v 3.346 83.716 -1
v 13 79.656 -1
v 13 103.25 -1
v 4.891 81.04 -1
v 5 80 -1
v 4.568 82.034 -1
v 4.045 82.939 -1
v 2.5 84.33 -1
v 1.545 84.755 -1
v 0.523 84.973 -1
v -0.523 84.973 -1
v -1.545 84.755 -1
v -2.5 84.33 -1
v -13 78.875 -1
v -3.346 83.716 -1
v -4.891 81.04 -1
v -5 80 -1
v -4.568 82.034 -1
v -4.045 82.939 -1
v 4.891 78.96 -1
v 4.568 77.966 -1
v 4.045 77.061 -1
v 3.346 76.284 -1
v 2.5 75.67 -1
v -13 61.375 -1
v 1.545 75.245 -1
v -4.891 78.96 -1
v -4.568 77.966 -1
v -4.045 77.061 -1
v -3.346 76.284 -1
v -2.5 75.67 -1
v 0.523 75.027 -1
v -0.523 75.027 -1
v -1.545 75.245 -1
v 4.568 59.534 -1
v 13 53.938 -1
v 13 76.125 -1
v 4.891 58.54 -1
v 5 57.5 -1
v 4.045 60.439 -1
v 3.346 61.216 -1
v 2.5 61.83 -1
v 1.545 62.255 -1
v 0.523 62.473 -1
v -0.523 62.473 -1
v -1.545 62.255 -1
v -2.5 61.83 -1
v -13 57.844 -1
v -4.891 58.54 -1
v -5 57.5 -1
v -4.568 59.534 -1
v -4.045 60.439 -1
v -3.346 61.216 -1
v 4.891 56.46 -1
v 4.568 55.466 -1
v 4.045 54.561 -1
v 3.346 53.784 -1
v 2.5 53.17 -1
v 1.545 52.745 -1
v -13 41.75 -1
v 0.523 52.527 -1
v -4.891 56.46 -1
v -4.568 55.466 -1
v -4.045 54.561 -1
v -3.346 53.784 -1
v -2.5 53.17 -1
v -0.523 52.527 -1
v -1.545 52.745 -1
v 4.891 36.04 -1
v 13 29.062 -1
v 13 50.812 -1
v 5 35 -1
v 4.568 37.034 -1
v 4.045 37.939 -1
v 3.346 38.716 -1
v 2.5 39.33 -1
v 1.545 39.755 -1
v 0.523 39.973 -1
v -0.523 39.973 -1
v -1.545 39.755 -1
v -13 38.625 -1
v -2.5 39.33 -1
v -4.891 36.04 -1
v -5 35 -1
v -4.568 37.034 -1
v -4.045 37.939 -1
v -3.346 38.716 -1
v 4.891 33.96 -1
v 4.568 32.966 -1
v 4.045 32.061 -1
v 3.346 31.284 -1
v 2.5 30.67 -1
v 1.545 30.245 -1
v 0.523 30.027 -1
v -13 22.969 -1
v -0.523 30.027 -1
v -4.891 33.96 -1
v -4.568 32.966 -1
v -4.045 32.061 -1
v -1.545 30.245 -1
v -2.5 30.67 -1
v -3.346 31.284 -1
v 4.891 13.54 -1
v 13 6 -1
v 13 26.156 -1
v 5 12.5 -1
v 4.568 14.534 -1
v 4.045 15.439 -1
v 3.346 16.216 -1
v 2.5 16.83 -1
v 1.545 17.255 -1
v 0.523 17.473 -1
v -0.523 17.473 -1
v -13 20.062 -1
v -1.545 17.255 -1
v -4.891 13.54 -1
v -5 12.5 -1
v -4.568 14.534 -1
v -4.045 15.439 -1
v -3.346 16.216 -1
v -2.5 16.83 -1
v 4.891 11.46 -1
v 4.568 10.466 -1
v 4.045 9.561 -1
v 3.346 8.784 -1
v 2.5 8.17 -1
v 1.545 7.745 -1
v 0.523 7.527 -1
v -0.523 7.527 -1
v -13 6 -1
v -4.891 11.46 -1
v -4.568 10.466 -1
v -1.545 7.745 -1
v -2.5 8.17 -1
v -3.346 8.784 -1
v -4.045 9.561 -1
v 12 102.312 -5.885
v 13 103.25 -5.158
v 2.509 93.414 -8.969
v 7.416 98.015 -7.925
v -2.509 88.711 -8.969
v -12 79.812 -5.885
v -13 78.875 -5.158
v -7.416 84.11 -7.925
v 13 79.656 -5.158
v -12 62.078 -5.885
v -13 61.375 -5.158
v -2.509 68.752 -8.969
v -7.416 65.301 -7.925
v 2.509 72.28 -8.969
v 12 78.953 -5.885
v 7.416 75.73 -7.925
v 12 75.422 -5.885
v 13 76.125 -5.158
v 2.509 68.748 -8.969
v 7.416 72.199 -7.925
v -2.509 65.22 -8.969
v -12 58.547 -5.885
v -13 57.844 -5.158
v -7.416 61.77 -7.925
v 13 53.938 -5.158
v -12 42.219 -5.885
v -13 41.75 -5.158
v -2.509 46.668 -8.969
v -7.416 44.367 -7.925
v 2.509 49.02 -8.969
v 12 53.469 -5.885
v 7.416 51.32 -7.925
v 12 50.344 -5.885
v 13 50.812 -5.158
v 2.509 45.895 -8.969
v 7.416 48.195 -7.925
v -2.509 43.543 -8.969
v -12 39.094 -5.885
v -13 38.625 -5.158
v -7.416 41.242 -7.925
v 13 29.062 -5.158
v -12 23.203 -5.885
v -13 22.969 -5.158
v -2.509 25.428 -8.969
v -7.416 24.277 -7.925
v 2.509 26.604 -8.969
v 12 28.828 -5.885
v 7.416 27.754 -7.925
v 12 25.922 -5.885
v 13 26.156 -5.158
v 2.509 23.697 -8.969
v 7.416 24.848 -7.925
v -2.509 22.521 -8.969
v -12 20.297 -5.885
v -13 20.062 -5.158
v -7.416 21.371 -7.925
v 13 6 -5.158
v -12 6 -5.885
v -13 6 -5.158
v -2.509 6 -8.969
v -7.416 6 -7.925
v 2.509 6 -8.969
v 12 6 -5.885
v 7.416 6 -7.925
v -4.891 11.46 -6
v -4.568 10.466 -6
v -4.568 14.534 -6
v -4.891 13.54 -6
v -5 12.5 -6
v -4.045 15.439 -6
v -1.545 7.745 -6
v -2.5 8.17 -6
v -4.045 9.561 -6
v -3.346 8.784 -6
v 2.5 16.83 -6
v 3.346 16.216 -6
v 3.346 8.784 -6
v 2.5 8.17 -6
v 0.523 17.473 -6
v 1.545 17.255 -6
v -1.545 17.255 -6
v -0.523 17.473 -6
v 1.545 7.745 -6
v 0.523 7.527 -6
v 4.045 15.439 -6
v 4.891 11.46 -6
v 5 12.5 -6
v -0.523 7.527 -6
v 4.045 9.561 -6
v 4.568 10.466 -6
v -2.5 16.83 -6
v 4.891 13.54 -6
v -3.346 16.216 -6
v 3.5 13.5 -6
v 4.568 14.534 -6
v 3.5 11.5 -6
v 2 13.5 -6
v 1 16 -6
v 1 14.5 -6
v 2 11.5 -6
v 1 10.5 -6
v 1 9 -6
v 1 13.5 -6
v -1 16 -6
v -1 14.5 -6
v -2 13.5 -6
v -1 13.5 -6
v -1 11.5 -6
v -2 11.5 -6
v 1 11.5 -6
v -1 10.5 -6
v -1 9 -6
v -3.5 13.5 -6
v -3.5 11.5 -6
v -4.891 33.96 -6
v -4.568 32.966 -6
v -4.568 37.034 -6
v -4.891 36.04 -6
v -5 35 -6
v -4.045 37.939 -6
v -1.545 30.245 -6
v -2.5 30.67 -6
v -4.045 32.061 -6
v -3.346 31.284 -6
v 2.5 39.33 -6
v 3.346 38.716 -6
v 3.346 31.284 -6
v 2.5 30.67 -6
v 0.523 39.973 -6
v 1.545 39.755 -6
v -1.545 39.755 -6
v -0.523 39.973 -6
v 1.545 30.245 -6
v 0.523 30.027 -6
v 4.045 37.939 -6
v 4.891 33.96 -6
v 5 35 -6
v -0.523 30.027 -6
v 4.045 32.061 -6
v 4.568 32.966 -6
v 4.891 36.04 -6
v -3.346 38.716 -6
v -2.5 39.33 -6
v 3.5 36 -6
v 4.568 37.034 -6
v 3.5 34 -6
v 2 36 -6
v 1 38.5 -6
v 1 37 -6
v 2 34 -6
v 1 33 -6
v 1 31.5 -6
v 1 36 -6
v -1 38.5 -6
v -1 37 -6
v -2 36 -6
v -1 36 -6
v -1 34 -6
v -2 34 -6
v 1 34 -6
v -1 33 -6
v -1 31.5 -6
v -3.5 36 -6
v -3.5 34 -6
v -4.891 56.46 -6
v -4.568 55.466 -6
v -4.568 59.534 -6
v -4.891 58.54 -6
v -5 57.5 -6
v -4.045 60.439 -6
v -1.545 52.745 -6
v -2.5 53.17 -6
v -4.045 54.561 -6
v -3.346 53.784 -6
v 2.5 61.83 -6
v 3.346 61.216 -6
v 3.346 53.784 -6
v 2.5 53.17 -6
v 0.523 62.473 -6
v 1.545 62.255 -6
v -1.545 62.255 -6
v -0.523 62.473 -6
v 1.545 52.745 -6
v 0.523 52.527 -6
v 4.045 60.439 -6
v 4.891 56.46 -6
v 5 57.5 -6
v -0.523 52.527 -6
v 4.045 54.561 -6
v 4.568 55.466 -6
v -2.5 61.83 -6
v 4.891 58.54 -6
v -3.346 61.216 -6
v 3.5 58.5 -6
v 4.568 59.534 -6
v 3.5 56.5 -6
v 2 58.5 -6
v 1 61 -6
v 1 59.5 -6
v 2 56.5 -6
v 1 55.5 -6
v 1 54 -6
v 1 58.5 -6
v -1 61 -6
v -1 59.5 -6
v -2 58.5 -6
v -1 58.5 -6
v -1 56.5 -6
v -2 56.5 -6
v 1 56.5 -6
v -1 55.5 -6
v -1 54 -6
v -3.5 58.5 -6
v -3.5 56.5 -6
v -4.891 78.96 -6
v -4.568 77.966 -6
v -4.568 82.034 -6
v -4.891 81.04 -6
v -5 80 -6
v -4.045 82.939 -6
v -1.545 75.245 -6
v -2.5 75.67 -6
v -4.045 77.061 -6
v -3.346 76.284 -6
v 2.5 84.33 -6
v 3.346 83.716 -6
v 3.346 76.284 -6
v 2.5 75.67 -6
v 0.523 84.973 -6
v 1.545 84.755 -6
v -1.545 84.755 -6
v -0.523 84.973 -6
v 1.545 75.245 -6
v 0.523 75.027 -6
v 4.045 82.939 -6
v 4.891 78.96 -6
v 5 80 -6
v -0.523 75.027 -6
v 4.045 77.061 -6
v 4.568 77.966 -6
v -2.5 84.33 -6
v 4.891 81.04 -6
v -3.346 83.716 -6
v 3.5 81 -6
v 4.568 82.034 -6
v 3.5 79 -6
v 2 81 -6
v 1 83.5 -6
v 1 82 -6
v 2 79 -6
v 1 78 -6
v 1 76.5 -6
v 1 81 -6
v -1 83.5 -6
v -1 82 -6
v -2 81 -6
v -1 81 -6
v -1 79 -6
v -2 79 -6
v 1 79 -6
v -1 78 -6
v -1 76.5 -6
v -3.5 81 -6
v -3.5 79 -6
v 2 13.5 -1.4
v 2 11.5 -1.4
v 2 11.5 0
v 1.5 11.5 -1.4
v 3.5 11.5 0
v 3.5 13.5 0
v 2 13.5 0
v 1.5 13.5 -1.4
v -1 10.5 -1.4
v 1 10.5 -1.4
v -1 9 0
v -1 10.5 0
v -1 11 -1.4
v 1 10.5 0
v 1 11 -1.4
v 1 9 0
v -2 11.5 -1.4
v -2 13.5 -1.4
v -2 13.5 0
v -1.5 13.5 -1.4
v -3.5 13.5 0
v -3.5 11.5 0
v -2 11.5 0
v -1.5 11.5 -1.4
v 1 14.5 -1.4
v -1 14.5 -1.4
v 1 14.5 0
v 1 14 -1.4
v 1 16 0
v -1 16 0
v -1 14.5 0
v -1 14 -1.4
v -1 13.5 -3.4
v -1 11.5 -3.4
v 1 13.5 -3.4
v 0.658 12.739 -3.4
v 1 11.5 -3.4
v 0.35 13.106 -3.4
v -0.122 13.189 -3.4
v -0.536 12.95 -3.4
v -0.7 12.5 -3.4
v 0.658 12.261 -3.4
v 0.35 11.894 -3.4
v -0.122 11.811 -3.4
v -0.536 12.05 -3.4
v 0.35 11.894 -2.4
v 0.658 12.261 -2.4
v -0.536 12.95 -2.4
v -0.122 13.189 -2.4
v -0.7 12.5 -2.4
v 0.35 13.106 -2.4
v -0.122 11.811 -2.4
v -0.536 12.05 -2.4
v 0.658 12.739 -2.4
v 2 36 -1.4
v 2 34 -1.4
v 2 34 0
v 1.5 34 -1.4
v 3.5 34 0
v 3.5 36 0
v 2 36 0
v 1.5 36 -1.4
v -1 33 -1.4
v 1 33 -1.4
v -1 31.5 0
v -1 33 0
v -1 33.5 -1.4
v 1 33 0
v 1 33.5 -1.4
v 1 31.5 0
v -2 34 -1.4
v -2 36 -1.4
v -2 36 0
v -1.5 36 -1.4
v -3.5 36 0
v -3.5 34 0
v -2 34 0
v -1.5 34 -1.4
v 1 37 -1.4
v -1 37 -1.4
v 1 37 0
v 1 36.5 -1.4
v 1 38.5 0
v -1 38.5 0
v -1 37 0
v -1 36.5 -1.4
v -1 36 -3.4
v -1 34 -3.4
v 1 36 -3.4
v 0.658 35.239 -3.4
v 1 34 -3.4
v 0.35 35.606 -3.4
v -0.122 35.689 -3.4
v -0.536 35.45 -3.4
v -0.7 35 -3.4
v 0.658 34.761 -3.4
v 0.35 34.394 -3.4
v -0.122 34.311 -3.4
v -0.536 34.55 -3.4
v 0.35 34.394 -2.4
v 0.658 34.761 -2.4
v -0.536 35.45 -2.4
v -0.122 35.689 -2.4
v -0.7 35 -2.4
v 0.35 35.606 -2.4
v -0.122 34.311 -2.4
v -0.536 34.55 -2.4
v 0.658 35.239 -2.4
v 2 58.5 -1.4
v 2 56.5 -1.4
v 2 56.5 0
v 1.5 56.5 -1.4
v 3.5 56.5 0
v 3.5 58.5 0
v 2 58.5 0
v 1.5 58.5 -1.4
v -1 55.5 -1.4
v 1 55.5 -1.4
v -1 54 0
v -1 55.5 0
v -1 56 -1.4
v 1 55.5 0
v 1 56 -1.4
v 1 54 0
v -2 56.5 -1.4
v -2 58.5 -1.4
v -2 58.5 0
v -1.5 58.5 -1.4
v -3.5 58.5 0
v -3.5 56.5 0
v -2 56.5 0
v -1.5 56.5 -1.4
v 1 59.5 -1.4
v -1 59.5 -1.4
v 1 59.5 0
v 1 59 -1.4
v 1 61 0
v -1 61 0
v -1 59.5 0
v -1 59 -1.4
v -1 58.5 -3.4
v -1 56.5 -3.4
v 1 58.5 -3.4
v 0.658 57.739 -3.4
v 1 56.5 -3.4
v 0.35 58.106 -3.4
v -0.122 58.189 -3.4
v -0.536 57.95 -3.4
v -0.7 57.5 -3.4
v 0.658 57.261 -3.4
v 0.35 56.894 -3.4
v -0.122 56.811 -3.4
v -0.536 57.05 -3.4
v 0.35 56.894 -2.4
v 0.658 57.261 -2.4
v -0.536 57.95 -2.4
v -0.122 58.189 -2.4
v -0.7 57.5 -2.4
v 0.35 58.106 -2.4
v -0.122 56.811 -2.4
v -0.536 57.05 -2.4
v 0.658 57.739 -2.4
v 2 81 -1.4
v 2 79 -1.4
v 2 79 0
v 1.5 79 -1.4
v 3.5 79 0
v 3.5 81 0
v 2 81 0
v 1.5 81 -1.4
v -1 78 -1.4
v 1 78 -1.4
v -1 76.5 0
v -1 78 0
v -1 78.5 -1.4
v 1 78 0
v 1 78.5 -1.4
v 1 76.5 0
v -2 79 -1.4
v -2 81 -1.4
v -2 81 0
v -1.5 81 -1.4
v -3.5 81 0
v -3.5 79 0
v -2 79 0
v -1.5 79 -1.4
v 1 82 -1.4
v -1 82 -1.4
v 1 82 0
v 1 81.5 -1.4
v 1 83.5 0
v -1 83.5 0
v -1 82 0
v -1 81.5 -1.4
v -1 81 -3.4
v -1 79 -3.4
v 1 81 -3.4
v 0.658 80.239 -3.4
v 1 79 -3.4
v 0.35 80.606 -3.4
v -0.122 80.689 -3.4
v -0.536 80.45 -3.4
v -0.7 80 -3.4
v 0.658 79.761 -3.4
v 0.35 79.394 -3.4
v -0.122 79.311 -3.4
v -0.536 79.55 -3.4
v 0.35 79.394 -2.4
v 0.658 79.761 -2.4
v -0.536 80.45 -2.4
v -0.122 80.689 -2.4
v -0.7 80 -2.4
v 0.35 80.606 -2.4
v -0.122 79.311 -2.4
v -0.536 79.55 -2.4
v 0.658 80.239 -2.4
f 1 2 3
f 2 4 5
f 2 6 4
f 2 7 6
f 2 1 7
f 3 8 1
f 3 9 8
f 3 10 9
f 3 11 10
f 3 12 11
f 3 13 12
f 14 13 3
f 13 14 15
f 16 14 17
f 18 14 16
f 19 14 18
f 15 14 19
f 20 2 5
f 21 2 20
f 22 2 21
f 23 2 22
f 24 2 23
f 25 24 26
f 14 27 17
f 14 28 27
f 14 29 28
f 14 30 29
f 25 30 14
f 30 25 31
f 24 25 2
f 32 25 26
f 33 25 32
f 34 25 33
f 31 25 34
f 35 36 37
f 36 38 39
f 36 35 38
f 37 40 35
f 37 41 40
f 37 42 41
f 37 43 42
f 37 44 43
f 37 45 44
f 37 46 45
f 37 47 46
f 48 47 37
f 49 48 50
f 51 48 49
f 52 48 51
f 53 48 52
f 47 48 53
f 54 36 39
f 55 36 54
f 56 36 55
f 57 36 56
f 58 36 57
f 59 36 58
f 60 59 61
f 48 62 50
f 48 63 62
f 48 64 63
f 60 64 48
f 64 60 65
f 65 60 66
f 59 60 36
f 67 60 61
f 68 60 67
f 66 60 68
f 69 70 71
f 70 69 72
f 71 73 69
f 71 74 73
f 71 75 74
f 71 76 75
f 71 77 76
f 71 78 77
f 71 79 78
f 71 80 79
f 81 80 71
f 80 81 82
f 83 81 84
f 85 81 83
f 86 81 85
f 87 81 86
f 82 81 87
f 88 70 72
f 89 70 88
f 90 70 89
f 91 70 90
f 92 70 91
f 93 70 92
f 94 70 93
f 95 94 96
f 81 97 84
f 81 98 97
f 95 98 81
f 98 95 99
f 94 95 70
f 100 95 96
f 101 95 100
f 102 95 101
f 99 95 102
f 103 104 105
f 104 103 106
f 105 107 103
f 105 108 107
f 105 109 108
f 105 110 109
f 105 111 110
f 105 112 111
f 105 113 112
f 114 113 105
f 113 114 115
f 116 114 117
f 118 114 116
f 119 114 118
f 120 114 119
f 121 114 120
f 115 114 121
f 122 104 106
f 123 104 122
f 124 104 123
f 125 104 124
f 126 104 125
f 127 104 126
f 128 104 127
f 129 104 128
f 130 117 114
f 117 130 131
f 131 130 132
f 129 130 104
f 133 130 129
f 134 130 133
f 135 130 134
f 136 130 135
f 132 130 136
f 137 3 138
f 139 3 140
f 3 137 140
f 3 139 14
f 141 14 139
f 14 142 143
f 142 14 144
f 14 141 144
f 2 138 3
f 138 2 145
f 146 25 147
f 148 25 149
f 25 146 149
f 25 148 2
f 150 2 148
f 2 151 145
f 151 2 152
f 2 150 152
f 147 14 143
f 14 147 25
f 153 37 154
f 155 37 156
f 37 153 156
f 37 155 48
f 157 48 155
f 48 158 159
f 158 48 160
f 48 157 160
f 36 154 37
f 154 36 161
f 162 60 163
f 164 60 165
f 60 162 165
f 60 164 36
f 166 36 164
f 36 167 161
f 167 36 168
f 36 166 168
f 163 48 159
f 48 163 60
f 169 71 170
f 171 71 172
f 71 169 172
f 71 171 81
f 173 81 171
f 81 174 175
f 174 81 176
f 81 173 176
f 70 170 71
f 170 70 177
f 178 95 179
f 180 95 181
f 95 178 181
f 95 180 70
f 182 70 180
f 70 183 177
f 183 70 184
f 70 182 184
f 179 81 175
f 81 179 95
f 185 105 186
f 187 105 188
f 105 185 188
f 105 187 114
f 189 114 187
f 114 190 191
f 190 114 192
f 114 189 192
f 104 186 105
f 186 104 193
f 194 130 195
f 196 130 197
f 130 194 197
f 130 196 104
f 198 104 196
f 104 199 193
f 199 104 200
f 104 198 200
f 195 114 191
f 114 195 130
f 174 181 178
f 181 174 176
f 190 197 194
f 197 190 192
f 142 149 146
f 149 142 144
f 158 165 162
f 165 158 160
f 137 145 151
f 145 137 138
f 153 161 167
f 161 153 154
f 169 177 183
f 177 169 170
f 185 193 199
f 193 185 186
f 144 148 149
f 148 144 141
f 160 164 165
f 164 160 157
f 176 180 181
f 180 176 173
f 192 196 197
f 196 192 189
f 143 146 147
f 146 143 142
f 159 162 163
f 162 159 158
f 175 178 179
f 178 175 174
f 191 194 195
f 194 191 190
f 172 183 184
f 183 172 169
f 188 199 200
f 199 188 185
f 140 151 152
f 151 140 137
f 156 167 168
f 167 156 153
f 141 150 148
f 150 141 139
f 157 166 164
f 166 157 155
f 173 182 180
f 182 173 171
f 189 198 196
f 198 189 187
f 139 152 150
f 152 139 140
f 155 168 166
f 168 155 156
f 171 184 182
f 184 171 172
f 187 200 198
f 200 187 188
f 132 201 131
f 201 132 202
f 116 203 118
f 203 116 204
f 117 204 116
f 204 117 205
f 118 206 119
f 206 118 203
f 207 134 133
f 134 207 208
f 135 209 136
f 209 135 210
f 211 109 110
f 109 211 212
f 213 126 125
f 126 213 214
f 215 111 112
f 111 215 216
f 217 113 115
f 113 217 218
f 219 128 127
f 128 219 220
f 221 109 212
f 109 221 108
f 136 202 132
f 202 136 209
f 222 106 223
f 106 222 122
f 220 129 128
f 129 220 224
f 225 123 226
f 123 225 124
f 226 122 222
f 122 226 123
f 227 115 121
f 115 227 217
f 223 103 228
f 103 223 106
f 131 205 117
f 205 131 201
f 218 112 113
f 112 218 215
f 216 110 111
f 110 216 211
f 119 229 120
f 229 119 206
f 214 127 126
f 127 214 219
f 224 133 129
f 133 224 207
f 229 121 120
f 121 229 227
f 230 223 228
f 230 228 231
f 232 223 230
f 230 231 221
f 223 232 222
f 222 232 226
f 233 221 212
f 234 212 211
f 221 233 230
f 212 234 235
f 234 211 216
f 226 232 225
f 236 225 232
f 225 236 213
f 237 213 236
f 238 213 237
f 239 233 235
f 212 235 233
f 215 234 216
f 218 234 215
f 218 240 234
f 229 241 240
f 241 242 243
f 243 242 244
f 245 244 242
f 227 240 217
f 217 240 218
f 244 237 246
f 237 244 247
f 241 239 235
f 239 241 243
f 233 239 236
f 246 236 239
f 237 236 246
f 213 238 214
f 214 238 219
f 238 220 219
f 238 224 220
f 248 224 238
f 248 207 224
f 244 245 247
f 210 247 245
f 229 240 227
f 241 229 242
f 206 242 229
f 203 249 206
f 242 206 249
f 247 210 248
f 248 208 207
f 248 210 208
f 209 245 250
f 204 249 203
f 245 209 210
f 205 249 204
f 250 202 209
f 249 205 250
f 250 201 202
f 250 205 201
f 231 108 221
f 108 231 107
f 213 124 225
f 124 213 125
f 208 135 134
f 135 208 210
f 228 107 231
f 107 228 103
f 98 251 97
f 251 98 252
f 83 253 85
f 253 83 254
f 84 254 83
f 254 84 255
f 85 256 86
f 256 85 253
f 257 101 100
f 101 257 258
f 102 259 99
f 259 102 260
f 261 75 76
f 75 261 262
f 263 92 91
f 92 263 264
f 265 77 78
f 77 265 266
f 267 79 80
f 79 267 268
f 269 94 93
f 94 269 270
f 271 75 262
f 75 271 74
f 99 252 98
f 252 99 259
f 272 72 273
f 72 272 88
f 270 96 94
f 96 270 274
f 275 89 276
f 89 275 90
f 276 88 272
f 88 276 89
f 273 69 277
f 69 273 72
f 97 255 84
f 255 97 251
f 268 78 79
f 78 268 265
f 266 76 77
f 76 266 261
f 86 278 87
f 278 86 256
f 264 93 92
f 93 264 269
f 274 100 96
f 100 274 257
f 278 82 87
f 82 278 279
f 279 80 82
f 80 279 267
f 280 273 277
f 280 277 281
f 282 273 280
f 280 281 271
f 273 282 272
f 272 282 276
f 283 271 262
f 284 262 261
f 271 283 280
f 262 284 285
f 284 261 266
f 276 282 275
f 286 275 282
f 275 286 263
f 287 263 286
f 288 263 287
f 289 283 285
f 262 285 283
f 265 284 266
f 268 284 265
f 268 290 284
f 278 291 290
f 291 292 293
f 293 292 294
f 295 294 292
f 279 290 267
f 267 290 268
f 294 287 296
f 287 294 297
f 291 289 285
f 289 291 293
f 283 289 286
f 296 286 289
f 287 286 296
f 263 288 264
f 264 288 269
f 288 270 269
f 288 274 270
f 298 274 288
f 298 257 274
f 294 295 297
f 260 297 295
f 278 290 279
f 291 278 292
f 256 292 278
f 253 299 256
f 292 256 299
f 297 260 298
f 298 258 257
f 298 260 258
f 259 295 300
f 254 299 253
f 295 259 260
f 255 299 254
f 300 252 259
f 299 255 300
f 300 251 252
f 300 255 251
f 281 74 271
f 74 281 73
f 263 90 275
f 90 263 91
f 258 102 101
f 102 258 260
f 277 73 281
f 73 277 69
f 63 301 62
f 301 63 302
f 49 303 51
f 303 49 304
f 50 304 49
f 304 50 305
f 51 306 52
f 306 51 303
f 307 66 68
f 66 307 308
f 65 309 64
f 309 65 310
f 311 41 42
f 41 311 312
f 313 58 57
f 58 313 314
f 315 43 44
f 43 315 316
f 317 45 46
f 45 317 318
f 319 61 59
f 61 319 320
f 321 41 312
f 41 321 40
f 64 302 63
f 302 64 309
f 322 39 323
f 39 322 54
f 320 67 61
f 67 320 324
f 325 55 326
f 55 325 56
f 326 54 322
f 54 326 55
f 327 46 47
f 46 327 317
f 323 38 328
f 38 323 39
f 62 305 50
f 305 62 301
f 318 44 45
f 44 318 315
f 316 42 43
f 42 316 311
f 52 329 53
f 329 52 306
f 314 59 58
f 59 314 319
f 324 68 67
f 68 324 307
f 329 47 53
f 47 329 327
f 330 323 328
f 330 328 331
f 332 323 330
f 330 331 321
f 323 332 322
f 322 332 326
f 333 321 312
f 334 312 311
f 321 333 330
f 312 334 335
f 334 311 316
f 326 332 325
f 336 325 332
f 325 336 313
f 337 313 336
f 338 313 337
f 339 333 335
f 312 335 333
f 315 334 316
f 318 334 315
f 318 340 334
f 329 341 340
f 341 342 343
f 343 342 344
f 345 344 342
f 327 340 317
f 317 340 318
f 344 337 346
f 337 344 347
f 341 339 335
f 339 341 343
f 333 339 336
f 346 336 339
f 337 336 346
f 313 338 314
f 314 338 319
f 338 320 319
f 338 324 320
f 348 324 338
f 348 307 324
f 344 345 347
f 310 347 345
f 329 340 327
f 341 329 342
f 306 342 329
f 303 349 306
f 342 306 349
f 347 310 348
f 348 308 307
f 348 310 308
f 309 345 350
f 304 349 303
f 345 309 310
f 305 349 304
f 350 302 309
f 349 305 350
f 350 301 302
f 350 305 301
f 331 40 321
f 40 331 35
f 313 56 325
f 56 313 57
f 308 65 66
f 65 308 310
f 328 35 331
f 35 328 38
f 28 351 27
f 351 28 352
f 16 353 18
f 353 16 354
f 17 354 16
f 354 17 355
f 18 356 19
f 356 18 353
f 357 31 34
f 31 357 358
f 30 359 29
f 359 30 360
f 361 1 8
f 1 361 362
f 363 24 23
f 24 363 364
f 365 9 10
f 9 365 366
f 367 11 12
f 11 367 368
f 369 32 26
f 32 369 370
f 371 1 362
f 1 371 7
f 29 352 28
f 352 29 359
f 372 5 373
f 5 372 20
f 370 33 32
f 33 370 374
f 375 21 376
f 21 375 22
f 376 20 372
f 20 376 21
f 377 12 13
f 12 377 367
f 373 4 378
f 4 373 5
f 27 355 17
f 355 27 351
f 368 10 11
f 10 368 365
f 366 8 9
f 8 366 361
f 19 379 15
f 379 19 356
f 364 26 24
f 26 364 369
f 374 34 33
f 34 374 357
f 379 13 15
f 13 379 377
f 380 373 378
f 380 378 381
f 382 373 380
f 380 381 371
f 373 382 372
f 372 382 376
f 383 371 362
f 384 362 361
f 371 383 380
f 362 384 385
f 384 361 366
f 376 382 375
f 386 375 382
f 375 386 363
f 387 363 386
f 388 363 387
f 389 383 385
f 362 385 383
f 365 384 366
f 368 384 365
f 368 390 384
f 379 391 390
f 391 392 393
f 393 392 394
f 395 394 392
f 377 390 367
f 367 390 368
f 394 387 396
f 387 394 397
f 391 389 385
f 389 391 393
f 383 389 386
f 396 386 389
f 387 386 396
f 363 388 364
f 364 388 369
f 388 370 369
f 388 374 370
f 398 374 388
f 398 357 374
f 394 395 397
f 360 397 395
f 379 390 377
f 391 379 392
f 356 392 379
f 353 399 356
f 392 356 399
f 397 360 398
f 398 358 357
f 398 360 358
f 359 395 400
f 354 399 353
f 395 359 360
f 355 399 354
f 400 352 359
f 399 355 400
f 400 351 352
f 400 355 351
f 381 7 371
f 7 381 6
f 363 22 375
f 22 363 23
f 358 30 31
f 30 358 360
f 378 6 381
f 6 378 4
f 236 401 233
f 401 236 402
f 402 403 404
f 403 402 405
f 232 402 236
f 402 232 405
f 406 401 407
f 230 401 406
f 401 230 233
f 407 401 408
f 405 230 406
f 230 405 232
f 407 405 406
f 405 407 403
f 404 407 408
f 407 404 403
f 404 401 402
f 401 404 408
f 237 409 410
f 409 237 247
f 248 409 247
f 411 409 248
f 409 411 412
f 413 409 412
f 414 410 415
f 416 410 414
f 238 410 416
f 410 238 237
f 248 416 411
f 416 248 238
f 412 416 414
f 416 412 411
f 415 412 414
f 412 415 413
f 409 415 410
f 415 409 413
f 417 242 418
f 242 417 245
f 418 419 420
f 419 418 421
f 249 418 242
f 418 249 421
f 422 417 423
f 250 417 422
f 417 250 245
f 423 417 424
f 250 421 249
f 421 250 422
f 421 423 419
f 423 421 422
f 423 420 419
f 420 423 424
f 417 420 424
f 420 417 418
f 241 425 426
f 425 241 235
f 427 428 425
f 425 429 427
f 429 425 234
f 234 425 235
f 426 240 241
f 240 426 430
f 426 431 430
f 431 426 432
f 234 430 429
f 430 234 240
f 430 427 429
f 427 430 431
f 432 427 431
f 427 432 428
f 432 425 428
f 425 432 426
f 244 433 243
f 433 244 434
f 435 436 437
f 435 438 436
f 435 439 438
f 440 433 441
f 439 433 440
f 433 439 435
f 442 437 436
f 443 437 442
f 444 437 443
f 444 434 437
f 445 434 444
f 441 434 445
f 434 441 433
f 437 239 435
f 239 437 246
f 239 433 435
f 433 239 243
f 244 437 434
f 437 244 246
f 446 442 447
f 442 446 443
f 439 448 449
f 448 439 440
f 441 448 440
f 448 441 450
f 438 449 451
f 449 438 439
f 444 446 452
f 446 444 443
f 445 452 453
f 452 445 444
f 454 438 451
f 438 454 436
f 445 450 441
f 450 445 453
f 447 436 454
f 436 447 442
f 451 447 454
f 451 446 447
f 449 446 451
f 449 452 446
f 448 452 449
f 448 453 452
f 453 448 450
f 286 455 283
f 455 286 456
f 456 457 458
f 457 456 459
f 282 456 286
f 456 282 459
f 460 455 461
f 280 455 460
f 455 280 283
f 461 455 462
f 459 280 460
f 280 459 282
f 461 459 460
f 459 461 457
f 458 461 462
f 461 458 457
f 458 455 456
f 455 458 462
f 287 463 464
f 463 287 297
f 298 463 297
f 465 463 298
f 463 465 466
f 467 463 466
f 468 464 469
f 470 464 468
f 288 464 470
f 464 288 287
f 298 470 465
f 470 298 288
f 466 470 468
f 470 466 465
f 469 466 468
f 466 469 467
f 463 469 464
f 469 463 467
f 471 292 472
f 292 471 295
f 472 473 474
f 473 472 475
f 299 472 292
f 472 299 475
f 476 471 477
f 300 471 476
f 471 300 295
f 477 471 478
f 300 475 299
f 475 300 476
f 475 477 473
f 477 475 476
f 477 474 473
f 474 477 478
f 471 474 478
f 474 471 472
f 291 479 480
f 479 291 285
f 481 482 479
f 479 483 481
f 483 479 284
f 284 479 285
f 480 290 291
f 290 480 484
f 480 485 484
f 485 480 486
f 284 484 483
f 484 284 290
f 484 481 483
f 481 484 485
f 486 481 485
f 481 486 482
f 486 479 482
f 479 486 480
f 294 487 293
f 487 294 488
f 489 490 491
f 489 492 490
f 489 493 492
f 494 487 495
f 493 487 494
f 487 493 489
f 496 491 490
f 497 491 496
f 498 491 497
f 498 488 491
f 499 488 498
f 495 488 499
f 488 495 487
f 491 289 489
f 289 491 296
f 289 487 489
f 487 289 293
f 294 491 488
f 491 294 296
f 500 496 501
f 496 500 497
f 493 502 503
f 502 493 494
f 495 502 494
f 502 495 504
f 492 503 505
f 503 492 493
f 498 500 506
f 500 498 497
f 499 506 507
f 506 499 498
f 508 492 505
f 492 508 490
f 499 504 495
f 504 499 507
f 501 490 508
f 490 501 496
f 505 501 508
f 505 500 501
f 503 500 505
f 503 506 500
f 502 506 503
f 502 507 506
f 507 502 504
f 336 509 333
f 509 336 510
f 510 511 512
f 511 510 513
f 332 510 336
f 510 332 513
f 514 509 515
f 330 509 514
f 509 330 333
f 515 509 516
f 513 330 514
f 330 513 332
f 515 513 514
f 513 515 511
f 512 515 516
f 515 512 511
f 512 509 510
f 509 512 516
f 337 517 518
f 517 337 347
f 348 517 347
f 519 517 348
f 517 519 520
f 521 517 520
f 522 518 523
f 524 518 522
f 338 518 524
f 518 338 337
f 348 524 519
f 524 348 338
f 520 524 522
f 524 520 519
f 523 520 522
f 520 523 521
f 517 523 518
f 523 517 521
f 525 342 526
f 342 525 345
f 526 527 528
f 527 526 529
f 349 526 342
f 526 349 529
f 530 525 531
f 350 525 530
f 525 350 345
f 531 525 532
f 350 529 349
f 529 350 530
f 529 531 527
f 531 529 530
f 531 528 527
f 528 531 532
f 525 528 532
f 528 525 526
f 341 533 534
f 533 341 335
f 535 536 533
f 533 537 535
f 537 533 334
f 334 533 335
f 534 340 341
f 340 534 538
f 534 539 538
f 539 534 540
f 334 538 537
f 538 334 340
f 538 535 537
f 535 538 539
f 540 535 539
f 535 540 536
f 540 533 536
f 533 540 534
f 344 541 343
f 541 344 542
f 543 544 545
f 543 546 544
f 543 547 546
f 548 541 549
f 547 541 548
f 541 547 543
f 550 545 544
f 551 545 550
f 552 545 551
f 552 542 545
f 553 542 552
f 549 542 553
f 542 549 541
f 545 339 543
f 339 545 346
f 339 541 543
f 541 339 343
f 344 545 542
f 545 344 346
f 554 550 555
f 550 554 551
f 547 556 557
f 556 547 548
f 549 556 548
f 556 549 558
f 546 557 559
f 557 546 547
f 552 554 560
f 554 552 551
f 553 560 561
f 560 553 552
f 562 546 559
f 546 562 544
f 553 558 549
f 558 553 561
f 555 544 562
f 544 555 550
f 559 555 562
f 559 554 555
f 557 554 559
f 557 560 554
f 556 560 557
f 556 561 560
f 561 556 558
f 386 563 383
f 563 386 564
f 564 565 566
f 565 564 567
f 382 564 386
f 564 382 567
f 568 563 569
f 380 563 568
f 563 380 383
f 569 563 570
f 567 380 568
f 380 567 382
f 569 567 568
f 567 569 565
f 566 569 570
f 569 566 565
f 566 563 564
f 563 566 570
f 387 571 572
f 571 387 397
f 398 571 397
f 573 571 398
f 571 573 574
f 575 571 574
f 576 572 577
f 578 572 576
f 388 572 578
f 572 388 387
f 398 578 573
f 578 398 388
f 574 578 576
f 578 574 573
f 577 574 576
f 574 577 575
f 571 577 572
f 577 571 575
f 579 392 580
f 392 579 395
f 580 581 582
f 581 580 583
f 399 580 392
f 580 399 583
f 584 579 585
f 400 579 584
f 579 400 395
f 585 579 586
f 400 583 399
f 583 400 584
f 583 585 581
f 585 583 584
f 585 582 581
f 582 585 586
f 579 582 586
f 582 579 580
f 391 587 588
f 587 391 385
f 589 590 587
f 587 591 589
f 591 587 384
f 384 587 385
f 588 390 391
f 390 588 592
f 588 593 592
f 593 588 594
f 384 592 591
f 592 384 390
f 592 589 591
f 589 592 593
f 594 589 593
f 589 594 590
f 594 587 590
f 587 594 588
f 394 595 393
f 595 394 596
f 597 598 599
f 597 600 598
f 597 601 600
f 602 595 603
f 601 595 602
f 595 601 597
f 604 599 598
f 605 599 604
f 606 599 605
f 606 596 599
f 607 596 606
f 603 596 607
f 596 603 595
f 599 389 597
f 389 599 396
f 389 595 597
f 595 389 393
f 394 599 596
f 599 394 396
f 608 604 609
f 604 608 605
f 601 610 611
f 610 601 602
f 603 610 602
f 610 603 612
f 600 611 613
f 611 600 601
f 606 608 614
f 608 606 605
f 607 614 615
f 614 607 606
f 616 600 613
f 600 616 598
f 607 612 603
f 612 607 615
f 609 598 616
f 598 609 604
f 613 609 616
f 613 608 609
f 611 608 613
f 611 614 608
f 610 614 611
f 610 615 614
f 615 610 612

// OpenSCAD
// file: button_clips.scad
$fs=0.5;

color("darkorange",0.5) button_dock();
color("springgreen") button_clips();
color("red",0.5) button_clip_cavity();

//dock measurements
top_height = 1.8;
shaft_height = 1.4;
dock_height = top_height + shaft_height;
hole_radius = 0.8;
hole_depth = 1;
base_radius = 3.5;
module button_dock(){
	difference(){
		union(){
			translate([-2,-2,shaft_height])
				cube([4,4,top_height]);
			translate([-1.5,-1.5,0])
				cube([3,3,dock_height]);
			translate([0,0,-2])
				cylinder(h=2, r=base_radius);
		}
		translate([0,0,dock_height-hole_depth+0.1]) 
			cylinder(h=hole_depth, r=hole_radius);
	}
}

clip_width = 2;
clip_thick = 1.5;
clip_height = 7;
module button_clip(){
	translate([-(2+clip_thick),clip_width/2,0])
	rotate([90,0,0])
	union(){
		cube([clip_thick ,clip_height, clip_width]);
		linear_extrude(height=clip_width)
		polygon(
			points=[
				[0,0],
				[0,shaft_height],
				[clip_thick+0.5, shaft_height],
				[clip_thick,0]
			],
			paths=[
				[0,1,2,3]
			]
		);
	}
}

module middle_pin(){
	translate([-1,-1,dock_height+0.2]) cube([2,2,clip_height-dock_height-0.2]);
	translate([0,0,dock_height-hole_depth+0.2]) cylinder(h=hole_depth+0.2, r=hole_radius-0.1);
}

module button_clips(){
	rotate([0,0,0]) button_clip();
	rotate([0,0,90]) button_clip();
	rotate([0,0,180]) button_clip();
	rotate([0,0,270]) button_clip();
	middle_pin();
}

module button_clip_cavity(){
	translate([0,0,-1]) cylinder(h=clip_height, r=5);
}
// main file
use <button_clips.scad>;
//button_clips()
//button_clip_cavity()

//import("proto_1_body.stl");

//translate([10.9,10.9,0])
//rotate([90,0,-45])
//color("blue", 0.5)
rotate([0,180,0])buttons();

module buttons(){
	union(){
		difference(){
			translate([0,0,1])
			button_bodies();
			all_button_clip_cavities();
		}
		all_button_clips();
	}
}

module button_bodies(){
	intersection(){
		linear_extrude(height=10)
			import("proto_1_button_shadows.dxf");
		translate([0,0,-15.9])
		rotate([-90,0,0])
			cylinder(h=120, r= /*22.5*/ 24);
	}
}

module all_button_clips(){
	translate([0,12.5,0]) button_clips();
	translate([0,35,0]) button_clips();
	translate([0,57.5,0]) button_clips();
	translate([0,80,0]) button_clips();
}

module all_button_clip_cavities(){
	translate([0,12.5,0]) button_clip_cavity();
	translate([0,35,0]) button_clip_cavity();
	translate([0,57.5,0]) button_clip_cavity();
	translate([0,80,0]) button_clip_cavity();
}
